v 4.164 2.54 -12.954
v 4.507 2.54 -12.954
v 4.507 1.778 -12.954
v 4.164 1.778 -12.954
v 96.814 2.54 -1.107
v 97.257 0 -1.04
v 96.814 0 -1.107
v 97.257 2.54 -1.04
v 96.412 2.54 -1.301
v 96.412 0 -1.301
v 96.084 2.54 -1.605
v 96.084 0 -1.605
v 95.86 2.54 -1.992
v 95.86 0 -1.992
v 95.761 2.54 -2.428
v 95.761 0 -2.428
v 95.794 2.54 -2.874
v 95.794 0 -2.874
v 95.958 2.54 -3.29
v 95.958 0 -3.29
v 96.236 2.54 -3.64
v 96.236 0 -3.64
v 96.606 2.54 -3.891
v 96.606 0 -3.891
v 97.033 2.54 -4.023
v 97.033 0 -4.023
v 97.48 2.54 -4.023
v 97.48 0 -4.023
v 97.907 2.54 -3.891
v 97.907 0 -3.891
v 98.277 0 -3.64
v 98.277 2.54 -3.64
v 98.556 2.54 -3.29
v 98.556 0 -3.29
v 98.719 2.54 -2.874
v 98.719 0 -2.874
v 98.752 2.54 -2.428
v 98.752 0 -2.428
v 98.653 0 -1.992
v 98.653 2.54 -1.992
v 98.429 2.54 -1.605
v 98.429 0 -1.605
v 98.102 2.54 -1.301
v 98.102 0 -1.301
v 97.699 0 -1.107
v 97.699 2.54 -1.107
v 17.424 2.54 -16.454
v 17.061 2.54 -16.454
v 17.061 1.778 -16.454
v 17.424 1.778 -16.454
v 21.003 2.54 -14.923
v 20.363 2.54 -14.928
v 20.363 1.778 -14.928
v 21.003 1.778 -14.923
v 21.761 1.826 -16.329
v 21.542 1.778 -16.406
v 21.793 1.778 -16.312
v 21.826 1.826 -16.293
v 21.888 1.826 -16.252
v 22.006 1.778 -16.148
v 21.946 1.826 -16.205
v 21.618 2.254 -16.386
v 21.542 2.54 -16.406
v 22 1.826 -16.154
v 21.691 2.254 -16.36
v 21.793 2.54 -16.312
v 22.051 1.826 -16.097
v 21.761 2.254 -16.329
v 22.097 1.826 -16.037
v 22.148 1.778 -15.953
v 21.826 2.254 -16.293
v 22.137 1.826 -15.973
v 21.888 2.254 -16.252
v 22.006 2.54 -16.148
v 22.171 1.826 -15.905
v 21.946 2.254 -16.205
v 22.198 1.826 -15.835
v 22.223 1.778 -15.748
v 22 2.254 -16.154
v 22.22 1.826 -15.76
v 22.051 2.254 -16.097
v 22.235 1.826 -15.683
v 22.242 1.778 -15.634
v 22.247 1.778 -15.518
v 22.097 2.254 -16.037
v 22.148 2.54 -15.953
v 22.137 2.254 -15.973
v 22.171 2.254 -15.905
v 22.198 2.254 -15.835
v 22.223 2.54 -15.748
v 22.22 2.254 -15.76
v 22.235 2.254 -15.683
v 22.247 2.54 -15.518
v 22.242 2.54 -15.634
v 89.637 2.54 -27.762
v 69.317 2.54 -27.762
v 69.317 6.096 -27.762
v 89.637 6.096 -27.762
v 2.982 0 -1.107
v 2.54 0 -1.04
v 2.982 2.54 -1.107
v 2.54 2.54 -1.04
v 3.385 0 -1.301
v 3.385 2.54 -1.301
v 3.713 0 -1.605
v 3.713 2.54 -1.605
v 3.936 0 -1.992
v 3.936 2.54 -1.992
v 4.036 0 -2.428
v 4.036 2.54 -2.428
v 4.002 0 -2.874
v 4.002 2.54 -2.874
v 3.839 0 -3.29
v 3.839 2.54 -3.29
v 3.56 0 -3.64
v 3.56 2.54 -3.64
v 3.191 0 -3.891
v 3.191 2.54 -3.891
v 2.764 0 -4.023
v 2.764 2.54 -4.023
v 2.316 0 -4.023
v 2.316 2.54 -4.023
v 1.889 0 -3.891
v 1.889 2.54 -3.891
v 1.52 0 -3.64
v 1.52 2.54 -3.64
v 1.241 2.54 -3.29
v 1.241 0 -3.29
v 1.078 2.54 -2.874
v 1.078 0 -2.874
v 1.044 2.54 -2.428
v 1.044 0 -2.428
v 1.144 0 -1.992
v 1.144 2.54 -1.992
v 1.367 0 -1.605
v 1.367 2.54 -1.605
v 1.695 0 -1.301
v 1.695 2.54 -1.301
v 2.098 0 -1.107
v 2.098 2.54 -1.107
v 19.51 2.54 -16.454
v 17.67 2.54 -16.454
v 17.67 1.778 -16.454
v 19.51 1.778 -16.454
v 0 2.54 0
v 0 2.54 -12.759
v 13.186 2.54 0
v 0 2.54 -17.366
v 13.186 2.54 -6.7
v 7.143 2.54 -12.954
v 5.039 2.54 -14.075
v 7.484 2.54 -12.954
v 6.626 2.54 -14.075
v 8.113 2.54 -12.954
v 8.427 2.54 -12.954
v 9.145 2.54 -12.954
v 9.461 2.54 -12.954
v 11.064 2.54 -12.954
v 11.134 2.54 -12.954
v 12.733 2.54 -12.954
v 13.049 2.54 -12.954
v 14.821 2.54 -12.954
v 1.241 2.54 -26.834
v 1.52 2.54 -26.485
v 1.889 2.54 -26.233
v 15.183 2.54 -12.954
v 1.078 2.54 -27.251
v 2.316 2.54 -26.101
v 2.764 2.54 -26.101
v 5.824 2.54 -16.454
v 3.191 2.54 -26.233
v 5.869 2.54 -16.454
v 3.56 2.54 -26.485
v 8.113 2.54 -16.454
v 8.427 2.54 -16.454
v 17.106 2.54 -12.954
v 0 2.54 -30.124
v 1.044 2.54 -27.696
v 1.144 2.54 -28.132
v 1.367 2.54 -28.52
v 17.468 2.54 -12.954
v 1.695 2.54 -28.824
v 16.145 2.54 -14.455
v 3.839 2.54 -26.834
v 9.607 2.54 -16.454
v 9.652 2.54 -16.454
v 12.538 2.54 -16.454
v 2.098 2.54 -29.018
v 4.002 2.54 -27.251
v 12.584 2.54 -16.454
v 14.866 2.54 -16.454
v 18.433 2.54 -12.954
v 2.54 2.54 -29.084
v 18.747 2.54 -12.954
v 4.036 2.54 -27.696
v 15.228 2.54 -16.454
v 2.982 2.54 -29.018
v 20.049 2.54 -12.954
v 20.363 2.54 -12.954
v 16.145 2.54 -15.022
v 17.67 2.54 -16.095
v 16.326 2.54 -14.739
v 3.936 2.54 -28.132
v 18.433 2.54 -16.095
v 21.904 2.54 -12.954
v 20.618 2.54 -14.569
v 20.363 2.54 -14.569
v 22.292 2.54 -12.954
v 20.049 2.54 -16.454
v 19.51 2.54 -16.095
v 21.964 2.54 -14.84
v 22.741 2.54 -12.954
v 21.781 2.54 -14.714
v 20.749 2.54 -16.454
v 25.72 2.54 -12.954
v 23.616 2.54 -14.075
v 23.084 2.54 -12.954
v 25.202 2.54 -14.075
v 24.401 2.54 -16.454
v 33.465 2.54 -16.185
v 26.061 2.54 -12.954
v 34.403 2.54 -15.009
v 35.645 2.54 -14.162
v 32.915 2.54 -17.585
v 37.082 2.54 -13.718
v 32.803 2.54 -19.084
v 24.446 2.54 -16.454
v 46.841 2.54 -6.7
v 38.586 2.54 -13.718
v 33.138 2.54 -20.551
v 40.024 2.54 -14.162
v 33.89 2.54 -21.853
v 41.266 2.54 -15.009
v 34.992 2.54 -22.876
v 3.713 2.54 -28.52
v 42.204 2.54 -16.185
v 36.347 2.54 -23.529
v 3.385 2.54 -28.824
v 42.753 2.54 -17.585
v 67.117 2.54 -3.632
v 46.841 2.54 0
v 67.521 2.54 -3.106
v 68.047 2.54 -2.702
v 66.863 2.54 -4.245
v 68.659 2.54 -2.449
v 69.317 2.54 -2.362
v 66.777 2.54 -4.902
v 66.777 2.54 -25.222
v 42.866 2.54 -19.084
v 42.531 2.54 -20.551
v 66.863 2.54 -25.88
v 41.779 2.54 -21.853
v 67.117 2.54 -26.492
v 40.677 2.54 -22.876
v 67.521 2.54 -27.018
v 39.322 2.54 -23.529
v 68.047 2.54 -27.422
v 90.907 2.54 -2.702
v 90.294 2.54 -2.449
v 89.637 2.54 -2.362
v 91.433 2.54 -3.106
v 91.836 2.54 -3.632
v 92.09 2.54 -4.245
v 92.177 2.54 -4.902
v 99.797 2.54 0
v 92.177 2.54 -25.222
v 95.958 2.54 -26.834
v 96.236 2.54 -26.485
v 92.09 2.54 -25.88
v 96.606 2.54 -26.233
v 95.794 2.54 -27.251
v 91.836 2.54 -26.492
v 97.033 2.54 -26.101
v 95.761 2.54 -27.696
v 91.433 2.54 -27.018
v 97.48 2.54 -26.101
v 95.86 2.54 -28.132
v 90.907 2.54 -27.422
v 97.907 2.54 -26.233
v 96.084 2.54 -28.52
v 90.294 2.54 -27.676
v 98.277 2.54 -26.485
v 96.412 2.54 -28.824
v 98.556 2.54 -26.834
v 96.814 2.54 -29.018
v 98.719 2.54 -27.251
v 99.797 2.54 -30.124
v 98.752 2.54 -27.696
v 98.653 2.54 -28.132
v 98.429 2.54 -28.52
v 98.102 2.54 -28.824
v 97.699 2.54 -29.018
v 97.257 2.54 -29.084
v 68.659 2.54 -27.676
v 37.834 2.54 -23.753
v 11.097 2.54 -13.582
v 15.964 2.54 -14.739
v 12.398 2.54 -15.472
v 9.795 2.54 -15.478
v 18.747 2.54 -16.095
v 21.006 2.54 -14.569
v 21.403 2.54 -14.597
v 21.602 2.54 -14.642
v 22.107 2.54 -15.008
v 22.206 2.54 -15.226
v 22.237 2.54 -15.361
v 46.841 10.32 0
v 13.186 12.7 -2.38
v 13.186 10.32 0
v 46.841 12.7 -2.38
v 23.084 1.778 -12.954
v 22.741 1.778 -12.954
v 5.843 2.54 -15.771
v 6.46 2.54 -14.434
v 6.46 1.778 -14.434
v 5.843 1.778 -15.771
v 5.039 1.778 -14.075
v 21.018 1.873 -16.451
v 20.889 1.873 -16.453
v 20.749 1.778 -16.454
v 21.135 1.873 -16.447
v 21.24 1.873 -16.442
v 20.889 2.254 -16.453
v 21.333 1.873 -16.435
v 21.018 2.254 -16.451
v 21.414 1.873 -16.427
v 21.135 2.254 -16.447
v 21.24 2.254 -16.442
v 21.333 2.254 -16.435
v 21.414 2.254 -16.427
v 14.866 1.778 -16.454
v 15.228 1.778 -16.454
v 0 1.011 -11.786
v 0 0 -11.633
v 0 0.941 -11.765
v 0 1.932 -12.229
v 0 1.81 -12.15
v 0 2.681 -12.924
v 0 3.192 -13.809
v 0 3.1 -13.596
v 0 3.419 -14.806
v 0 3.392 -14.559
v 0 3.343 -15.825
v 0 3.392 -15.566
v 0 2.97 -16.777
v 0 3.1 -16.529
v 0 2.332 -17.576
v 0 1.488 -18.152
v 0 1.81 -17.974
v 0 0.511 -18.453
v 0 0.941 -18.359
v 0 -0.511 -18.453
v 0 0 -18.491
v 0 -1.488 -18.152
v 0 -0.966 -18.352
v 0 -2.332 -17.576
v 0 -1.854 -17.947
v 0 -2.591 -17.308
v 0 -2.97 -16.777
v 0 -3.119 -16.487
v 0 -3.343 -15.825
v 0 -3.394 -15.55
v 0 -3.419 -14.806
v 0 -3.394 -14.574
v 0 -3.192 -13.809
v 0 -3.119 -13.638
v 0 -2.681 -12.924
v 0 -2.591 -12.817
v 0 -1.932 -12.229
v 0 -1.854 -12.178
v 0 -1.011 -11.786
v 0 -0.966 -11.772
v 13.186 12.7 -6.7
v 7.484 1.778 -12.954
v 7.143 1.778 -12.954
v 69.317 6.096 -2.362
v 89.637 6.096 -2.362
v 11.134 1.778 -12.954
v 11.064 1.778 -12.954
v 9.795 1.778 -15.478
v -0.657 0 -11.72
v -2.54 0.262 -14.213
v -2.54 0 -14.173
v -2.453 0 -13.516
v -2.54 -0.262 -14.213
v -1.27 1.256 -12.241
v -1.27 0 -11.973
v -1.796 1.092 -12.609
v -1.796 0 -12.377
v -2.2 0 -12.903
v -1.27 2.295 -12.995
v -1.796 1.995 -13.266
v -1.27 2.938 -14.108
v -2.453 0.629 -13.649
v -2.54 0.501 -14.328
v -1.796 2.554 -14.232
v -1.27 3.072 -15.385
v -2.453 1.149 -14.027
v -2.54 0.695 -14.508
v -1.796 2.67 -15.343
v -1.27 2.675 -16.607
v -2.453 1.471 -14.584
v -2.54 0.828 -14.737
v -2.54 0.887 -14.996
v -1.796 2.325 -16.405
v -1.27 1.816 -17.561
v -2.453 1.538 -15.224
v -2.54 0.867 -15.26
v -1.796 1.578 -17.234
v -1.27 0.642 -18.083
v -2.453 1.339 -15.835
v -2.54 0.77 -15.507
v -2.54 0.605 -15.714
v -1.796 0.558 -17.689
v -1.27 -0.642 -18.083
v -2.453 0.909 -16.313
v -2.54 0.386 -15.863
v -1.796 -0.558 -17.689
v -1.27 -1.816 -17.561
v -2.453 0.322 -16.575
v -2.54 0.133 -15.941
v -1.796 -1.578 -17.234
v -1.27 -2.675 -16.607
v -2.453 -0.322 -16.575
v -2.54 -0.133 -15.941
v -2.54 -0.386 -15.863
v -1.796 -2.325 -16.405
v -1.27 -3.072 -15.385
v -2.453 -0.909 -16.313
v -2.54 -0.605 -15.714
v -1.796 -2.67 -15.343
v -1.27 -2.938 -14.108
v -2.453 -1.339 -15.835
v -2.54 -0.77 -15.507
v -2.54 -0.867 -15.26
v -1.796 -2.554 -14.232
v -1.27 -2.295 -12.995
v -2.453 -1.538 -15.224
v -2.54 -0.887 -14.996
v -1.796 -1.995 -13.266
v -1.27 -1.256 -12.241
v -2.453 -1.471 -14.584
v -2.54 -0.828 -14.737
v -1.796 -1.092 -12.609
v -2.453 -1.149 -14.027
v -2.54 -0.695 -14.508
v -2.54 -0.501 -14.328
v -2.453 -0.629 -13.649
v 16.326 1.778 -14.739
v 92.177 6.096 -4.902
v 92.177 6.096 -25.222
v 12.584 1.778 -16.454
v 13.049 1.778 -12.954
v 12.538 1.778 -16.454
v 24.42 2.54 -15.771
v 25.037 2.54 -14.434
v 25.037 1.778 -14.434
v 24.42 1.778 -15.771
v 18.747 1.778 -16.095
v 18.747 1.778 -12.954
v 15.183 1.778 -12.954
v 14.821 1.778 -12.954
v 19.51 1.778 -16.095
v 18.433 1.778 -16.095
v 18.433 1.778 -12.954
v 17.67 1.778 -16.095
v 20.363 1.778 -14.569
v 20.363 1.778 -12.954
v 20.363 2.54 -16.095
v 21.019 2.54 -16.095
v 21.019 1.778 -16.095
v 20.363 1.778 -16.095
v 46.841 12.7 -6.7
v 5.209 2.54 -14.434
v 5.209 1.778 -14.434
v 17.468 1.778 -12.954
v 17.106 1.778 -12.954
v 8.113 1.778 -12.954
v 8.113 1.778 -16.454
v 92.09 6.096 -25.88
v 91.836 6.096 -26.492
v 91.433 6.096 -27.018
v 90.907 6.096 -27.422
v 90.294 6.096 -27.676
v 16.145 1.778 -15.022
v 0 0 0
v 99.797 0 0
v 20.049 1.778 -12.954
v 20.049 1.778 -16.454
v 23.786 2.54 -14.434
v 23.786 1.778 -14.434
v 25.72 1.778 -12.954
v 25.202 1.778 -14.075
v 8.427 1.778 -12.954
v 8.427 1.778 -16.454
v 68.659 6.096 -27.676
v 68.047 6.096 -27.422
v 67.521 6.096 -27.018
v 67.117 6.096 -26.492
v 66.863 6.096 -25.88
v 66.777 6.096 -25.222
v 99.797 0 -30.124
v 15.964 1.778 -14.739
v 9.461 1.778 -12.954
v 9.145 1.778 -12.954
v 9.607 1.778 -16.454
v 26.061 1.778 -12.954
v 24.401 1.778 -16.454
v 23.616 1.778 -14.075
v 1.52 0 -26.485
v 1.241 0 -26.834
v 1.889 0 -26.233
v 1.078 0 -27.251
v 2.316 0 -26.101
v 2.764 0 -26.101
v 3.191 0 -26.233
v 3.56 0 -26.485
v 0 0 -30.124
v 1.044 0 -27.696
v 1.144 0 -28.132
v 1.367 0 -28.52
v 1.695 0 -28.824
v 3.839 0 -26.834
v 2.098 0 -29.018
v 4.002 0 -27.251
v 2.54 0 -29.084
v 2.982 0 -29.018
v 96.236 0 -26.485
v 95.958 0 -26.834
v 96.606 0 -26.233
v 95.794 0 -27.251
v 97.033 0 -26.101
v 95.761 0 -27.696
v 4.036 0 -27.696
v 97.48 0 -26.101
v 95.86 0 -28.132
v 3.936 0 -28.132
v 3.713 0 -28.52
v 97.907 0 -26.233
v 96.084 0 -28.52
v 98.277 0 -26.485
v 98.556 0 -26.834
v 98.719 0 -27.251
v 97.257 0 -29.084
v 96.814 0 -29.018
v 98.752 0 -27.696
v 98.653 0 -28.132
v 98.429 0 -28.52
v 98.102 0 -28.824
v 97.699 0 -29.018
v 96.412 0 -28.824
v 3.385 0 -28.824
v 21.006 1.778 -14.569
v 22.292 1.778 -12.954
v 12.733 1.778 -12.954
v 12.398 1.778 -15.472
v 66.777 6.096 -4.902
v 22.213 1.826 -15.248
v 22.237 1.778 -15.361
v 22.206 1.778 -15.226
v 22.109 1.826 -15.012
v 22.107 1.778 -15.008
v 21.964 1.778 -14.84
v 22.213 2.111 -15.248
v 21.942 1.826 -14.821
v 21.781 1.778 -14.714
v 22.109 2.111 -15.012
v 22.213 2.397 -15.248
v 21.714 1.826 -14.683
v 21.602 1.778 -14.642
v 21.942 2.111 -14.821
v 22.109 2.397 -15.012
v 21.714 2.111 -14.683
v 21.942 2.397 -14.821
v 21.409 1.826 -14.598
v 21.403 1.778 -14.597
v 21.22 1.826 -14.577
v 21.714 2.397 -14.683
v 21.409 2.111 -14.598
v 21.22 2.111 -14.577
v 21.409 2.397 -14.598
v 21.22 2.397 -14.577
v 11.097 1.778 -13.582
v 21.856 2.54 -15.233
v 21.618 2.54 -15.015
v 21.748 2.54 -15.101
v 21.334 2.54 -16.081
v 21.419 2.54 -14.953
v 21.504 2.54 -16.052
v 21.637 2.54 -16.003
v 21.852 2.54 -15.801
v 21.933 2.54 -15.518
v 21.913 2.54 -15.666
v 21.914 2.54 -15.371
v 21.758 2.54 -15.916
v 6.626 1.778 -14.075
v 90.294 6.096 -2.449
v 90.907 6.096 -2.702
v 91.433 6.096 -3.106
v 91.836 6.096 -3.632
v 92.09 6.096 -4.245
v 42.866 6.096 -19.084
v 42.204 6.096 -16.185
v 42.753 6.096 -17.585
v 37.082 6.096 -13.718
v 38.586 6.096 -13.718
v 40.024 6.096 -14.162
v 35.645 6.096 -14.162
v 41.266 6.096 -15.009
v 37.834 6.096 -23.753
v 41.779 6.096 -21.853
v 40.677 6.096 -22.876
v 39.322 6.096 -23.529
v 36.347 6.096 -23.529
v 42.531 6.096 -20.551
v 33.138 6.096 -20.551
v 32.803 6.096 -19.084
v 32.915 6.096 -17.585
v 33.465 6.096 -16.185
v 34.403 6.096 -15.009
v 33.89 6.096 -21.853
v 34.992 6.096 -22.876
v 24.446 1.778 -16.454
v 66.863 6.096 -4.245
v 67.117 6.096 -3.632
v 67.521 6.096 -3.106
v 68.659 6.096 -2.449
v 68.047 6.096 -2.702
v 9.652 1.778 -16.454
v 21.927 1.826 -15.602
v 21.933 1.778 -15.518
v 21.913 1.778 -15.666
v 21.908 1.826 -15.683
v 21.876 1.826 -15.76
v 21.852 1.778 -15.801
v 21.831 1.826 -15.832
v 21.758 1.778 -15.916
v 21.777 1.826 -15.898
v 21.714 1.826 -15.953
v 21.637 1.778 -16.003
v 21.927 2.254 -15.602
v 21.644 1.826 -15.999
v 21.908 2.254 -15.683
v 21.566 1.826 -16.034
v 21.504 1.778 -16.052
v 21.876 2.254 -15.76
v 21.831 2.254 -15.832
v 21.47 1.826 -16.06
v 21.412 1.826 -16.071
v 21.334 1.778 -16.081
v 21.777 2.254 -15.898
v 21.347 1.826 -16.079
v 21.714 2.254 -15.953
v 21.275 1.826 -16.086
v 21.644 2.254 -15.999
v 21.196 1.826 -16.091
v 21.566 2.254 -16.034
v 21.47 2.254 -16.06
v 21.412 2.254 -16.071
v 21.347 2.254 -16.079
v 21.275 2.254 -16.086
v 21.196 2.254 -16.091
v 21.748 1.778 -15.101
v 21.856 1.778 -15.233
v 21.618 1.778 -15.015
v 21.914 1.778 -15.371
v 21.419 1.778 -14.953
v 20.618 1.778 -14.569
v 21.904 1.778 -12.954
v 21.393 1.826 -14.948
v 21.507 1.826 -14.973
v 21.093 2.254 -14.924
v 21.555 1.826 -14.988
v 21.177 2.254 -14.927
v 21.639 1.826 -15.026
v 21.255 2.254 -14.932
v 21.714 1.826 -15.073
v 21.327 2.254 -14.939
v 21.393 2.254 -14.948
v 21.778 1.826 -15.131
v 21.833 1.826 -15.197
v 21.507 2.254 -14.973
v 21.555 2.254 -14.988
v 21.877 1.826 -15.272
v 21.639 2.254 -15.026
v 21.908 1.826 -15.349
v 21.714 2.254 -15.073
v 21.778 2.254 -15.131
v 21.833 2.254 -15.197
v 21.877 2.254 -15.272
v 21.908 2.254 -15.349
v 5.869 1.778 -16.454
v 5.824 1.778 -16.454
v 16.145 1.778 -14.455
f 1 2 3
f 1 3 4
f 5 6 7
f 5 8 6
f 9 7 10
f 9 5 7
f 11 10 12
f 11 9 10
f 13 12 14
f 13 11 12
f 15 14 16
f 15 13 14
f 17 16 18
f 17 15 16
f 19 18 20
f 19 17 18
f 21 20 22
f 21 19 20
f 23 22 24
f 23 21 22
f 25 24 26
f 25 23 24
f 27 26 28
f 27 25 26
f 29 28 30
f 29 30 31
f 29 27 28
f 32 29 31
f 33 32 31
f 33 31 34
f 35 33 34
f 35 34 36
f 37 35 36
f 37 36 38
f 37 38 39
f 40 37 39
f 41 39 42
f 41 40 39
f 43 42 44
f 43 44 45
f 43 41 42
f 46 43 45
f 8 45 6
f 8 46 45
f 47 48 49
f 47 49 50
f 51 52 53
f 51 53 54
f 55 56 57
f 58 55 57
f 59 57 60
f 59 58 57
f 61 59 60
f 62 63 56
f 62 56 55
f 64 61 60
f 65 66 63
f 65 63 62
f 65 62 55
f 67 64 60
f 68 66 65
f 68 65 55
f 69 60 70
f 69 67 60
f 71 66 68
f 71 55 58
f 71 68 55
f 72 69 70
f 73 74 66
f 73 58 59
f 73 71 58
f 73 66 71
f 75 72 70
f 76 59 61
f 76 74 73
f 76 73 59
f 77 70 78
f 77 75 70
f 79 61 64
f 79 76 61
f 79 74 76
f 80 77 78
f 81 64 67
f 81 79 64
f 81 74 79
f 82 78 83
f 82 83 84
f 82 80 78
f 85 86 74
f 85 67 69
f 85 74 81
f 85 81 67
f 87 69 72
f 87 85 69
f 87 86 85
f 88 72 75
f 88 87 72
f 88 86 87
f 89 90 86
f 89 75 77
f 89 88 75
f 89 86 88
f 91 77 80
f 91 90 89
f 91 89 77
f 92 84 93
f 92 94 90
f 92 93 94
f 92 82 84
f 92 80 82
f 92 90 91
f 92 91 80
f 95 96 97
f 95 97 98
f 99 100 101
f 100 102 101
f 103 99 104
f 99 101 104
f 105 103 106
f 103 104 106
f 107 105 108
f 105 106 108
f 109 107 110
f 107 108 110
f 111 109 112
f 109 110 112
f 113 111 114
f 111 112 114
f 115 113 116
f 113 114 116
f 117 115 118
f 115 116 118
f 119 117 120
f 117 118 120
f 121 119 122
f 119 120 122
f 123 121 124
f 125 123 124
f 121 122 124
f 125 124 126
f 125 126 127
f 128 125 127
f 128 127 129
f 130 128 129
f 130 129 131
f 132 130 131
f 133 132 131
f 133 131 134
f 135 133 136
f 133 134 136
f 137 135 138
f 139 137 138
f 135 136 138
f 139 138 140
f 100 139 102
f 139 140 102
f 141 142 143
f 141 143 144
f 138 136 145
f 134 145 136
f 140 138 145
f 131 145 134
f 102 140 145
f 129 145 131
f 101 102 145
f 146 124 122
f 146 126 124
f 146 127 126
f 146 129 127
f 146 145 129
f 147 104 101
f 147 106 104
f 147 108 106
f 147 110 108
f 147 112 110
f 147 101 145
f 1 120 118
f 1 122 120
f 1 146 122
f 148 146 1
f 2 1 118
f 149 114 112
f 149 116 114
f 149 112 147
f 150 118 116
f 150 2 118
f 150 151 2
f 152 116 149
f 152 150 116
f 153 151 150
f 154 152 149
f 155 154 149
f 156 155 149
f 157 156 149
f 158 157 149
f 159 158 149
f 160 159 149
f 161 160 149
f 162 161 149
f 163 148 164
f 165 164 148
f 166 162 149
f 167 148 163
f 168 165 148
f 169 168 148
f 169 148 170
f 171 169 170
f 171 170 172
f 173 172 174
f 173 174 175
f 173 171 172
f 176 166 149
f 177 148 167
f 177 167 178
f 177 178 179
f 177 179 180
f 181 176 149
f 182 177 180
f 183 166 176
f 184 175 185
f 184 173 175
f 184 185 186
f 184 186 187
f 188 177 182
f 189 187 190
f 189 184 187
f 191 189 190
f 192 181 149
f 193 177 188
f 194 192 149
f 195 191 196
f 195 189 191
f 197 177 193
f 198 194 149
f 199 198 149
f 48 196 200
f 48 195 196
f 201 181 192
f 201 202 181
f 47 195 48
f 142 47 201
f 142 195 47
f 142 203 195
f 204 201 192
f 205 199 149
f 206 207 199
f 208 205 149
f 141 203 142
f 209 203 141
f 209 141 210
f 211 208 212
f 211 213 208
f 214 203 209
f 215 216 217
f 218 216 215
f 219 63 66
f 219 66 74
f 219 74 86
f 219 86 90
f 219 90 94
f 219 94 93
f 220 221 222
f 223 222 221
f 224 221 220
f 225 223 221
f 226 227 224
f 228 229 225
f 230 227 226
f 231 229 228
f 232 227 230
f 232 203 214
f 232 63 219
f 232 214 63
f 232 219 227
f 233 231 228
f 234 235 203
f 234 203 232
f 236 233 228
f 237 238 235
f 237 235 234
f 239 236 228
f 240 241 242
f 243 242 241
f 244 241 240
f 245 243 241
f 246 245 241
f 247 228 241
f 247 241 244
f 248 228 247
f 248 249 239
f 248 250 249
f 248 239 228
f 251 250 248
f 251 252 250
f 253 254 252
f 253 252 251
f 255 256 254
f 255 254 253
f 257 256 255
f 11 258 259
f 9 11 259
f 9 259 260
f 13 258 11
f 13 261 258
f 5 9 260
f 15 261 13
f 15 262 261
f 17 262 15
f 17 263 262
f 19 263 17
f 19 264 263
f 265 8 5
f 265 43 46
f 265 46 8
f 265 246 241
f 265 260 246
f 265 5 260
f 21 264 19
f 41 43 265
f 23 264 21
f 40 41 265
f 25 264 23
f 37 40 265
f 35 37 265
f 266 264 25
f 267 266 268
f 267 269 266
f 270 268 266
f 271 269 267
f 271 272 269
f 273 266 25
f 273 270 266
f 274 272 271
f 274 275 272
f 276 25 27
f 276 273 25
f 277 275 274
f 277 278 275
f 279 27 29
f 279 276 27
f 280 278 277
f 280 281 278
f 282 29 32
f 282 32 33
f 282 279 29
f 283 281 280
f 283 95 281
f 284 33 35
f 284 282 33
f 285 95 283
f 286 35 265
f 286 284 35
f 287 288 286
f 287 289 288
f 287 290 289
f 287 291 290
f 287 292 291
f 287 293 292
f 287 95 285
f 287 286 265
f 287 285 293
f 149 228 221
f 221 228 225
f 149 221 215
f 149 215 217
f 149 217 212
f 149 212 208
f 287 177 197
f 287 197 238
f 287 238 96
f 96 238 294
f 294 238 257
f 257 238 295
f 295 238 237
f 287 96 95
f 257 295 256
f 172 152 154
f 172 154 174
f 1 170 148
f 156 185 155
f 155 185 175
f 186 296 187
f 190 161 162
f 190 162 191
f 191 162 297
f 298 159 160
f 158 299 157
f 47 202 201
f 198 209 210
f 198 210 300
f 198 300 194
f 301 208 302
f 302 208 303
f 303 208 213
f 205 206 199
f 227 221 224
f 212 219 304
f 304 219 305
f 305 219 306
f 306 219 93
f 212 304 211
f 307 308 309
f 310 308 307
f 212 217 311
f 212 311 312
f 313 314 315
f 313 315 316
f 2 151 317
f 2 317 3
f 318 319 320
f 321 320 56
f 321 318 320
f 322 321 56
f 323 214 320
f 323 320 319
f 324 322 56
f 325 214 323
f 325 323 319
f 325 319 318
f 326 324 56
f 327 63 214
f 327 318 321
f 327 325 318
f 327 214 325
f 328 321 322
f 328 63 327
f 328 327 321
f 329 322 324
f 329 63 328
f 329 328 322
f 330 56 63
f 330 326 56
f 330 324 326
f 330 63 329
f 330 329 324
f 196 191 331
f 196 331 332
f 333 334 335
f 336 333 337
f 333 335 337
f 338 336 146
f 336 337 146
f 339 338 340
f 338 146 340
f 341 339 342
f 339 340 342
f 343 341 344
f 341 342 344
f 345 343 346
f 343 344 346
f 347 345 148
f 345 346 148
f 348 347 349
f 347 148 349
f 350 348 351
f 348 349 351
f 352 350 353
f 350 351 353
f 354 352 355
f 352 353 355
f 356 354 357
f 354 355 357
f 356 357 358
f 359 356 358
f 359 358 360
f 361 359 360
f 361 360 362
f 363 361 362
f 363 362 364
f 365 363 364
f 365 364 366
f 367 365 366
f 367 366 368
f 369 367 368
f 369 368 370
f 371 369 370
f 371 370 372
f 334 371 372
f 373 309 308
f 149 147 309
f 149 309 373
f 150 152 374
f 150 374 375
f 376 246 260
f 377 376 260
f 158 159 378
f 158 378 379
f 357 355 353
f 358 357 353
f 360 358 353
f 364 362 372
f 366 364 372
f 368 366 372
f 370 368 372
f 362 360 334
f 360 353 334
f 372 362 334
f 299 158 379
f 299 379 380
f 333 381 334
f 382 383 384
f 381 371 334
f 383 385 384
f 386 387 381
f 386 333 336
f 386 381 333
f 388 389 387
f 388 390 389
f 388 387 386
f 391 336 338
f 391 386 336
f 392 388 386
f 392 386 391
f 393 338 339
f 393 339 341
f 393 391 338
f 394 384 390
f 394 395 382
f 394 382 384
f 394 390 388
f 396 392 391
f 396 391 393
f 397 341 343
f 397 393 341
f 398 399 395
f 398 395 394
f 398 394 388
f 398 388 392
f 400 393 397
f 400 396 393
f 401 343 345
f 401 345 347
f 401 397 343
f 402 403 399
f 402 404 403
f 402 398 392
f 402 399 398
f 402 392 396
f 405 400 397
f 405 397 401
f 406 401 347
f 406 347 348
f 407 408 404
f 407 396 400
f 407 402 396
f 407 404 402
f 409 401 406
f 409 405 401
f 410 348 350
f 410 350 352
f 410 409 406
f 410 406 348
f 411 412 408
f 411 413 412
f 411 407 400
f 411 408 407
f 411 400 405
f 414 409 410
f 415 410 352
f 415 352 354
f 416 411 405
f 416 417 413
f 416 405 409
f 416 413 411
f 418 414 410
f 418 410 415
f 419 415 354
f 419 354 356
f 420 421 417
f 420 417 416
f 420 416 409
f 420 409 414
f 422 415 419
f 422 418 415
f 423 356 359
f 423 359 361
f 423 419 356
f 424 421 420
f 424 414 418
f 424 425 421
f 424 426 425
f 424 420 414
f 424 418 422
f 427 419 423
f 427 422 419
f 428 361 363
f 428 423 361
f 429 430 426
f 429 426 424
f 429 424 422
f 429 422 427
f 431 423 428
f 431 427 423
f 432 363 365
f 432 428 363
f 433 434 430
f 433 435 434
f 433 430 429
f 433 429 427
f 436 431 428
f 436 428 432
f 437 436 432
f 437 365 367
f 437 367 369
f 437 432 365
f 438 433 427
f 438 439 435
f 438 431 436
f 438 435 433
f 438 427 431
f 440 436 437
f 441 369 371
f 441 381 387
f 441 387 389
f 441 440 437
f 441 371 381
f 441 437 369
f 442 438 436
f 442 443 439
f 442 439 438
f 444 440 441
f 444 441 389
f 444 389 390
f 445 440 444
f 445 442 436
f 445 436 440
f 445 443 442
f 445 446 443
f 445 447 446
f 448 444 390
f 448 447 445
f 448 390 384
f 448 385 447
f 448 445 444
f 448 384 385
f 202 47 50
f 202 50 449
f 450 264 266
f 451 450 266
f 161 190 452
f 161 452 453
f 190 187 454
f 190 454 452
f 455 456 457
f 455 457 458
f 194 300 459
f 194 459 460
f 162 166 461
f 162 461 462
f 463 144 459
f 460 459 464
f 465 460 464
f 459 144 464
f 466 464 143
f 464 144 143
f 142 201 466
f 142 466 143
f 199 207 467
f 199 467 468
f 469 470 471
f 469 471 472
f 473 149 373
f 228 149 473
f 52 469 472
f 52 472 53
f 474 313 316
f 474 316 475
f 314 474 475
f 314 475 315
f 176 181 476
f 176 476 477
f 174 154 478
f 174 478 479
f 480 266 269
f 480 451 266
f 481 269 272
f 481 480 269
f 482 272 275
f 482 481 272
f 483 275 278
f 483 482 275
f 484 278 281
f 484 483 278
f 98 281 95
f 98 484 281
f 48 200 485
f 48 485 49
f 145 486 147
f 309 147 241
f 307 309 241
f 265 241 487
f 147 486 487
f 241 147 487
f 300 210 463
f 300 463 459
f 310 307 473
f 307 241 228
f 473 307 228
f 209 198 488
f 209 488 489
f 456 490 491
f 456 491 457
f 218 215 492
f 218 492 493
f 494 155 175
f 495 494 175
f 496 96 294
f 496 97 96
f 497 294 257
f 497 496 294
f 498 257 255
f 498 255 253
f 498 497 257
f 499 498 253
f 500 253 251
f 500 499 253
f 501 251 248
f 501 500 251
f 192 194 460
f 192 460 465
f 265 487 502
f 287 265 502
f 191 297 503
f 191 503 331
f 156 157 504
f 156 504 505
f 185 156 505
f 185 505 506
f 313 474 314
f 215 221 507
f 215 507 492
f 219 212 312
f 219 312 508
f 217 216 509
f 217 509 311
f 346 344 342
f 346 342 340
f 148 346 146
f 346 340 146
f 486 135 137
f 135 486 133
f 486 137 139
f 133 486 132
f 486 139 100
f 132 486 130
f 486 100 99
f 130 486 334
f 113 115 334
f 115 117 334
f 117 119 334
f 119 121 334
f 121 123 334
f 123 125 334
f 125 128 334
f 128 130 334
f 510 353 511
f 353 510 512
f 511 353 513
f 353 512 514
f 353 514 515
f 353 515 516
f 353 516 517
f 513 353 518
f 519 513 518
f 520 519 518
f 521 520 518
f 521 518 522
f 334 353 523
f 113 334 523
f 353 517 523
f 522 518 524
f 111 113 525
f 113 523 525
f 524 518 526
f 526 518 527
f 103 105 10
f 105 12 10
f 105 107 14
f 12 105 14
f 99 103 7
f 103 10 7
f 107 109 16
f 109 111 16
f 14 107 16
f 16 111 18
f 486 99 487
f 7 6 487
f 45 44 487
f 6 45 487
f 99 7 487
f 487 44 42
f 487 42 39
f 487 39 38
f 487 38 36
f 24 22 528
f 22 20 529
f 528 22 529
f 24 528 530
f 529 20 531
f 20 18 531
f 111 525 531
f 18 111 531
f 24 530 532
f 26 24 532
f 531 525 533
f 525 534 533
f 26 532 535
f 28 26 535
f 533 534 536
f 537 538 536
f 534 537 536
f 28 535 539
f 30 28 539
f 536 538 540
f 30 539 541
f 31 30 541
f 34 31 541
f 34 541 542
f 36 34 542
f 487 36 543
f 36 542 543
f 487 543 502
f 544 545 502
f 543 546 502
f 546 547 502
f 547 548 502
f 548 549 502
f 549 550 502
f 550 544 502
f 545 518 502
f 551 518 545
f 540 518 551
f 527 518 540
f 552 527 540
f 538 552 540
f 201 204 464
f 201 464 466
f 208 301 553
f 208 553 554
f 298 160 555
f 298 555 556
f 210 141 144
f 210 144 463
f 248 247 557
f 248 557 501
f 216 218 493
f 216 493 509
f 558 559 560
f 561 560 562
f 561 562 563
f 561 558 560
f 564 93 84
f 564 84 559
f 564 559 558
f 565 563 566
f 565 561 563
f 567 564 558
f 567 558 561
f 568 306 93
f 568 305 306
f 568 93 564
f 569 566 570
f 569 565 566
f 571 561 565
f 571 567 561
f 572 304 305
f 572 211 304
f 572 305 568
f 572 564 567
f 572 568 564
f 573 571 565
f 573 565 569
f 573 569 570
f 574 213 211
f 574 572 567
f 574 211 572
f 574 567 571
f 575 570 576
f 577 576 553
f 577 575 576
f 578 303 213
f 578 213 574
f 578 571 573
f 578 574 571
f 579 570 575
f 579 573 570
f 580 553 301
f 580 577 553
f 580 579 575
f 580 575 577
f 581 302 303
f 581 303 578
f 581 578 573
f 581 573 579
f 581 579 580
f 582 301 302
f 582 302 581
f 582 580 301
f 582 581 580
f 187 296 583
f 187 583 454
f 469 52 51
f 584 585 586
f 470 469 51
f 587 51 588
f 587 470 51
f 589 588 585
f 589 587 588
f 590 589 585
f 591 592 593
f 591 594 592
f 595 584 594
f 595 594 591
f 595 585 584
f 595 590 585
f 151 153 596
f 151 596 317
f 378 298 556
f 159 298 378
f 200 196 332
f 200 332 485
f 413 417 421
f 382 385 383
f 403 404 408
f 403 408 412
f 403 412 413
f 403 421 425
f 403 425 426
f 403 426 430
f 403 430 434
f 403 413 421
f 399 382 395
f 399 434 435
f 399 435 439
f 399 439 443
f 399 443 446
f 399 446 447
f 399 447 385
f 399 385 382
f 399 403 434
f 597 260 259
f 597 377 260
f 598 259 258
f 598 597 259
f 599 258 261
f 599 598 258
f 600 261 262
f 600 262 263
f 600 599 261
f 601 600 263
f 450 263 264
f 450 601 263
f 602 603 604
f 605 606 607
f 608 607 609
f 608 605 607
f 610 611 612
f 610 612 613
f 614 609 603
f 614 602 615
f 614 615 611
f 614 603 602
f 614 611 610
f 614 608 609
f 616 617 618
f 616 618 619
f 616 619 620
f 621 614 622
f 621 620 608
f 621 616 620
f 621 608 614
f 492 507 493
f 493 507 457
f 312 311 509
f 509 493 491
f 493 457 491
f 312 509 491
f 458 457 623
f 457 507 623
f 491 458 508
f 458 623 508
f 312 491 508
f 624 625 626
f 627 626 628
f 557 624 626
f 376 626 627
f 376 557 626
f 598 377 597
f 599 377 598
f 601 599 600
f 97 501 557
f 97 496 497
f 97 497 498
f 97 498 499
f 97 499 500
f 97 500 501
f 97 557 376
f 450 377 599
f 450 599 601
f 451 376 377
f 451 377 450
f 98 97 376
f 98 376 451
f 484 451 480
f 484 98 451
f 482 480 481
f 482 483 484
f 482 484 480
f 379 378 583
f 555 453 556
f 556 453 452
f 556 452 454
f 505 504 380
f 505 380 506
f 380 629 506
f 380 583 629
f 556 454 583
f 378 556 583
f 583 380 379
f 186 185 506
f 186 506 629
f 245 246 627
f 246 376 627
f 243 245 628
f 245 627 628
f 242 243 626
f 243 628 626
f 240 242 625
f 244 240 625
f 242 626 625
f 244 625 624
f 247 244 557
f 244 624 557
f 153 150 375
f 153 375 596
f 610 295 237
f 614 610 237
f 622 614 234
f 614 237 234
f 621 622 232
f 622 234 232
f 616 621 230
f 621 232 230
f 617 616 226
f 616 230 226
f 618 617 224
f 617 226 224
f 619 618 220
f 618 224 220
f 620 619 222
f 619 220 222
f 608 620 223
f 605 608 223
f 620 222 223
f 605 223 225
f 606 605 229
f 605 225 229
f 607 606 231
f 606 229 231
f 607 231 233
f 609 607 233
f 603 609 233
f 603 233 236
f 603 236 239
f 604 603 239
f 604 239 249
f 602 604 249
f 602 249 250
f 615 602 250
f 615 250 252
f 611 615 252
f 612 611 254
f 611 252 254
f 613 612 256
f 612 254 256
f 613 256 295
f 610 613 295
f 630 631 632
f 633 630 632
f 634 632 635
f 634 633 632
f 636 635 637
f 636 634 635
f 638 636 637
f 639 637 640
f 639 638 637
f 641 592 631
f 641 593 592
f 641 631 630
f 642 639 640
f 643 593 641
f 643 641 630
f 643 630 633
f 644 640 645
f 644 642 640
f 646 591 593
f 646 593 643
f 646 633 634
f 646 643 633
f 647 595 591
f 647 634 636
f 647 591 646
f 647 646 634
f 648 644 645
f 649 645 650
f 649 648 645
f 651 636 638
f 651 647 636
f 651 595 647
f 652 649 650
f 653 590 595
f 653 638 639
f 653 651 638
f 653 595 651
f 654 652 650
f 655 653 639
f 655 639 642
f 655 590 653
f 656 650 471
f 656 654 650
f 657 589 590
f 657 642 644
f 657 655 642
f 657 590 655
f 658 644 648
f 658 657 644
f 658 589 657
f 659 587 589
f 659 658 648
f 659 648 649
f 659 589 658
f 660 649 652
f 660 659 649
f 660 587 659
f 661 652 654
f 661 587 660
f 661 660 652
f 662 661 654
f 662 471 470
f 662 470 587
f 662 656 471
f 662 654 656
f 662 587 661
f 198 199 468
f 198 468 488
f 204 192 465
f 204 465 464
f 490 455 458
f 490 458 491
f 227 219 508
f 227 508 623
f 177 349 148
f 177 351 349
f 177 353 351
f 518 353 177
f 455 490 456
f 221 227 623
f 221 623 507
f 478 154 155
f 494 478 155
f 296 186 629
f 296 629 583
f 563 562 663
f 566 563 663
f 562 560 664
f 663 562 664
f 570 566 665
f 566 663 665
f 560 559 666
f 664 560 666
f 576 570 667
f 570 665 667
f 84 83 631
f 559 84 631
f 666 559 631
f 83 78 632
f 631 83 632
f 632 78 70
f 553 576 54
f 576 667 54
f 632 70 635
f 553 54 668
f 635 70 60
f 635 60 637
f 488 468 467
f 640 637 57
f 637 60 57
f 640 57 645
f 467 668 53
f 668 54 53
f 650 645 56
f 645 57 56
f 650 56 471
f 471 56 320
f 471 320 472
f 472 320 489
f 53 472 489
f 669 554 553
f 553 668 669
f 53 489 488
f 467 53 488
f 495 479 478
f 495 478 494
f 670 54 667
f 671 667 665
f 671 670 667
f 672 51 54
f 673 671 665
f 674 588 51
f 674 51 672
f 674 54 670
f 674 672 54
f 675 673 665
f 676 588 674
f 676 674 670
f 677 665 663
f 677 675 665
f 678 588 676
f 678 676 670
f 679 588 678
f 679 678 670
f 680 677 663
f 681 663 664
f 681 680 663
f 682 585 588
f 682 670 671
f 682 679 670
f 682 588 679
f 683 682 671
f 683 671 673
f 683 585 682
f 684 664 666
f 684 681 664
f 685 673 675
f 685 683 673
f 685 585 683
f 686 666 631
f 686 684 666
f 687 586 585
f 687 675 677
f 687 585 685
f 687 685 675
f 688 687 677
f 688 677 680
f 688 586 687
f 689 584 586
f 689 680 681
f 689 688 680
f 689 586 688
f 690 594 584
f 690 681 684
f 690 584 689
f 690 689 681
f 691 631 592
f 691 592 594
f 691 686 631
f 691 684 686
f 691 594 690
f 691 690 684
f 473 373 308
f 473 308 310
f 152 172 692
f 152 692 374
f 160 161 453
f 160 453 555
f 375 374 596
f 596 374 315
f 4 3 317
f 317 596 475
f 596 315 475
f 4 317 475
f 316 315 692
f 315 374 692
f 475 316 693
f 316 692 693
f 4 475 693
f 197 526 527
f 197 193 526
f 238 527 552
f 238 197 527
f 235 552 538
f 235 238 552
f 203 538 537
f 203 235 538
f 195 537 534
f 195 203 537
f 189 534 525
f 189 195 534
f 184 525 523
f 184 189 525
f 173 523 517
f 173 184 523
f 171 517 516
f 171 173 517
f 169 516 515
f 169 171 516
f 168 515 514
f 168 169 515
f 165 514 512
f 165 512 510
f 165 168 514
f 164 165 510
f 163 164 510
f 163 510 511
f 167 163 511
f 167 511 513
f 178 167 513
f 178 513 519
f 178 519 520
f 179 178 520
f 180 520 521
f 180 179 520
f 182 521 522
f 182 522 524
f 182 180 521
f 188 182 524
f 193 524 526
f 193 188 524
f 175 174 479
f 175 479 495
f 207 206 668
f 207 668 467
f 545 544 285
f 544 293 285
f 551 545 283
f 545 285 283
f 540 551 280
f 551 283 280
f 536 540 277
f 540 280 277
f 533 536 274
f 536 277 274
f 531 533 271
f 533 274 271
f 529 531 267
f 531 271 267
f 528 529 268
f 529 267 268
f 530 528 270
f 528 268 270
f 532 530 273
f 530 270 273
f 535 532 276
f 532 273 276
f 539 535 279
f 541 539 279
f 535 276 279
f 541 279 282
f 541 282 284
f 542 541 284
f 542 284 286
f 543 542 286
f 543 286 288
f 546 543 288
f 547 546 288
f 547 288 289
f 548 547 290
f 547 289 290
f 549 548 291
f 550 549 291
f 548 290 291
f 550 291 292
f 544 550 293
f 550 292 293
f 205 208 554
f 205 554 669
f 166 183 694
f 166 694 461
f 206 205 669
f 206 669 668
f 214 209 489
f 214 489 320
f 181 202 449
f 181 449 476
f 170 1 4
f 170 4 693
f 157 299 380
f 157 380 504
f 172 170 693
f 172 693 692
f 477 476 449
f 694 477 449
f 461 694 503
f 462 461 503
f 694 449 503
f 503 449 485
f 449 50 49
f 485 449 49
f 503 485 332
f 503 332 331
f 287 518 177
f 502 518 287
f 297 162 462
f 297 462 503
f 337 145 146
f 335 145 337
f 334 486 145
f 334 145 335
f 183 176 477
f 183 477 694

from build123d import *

# Parameters (mm, degrees)
SKETCH1_W           = 99.7966
SKETCH1_H           = 30.1244
BOSS_EXTRUDE1_DEPTH = 2.54
SKETCH2_W           = 33.65475448
SKETCH2_H           = 6.70026545
BOSS_EXTRUDE2_DEPTH = 10.16
SKETCH3_R           = 5.045566178
SKETCH3_W           = 25.4
SKETCH3_H           = 25.4
BOSS_EXTRUDE3_DEPTH = 3.556
FILLET1_R           = 2.54
SKETCH4_R           = 3.429
BOSS_EXTRUDE4_DEPTH = 2.54
FILLET2_R           = 2.54
CHAMFER1_SIZE       = 2.38
SKETCH5_W           = 0.314102564
SKETCH5_H           = 3.5
CUT_EXTRUDE1_DEPTH  = 0.762


with BuildPart() as part:
    # Sketch1 → Boss-Extrude1 (new body)
    with BuildSketch(Plane(origin=(0, 0, 0), x_dir=(1, 0, 0), z_dir=(0, 1, 0))):
        with Locations((49.8983, 15.0622)):
            Rectangle(SKETCH1_W, SKETCH1_H)
    extrude(amount=BOSS_EXTRUDE1_DEPTH)

    # Sketch2 → Boss-Extrude2 (add)
    with BuildSketch(Plane(origin=(0, 2.54, 0), x_dir=(1, 0, 0), z_dir=(0, 1, 0))):
        with Locations((30.013421746, 3.350132725)):
            Rectangle(SKETCH2_W, SKETCH2_H)
    extrude(amount=BOSS_EXTRUDE2_DEPTH)

    # Sketch3 → Boss-Extrude3 (add)
    with BuildSketch(Plane(origin=(0, 2.54, 0), x_dir=(1, 0, 0), z_dir=(0, 1, 0))):
        with Locations(Location((37.834363192, 18.707427202, 0), (0, 0, 90))):
            Circle(SKETCH3_R)
        with Locations((79.4766, 15.0622)):
            Rectangle(SKETCH3_W, SKETCH3_H)
    extrude(amount=BOSS_EXTRUDE3_DEPTH)

    # Fillet1
    fillet1_edges = [part.edges().sort_by_distance(p)[0] for p in [
        (92.1766, 4.318, -27.7622),
        (66.7766, 4.318, -27.7622),
        (66.7766, 4.318, -2.3622),
        (92.1766, 4.318, -2.3622),
    ]]
    fillet(fillet1_edges, radius=FILLET1_R)

    # Sketch4 → Boss-Extrude4 (add)
    with BuildSketch(Plane.ZY):
        with Locations((-15.0622, 0)):
            Circle(SKETCH4_R)
    extrude(amount=BOSS_EXTRUDE4_DEPTH)

    # Fillet2
    fillet2_edges = [part.edges().sort_by_distance(p)[0] for p in [
        (-2.54, 0, -18.4912),
    ]]
    fillet(fillet2_edges, radius=FILLET2_R - 0.0001)  # a hair under: the kernel refuses the full size

    # Chamfer1
    chamfer1_edges = [part.edges().sort_by_distance(p)[0] for p in [
        (30.013421746, 12.7, 0),
    ]]
    chamfer(chamfer1_edges, length=CHAMFER1_SIZE)

    # Sketch5 → Cut-Extrude1 (cut)
    # profile 1 of 7: a face of its own
    with BuildSketch(Plane(origin=(0, 2.54, 0), x_dir=(1, 0, 0), z_dir=(0, 1, 0))):
        Polygon((5.86903585, 16.453640261), (7.484420465, 12.953640261), (7.142974151, 12.953640261), (6.625546267, 14.075435133), (5.038907645, 14.075435133), (4.506756203, 12.953640261), (4.163907645, 12.953640261), (5.824164055, 16.453640261), align=None)
        Polygon((5.843094344, 15.771448755), (5.209280241, 14.434409492), (6.460081523, 14.434409492), align=None, mode=Mode.SUBTRACT)
    # profile 2 of 7: a face of its own
    with BuildSketch(Plane(origin=(0, 2.54, 0), x_dir=(1, 0, 0), z_dir=(0, 1, 0))):
        with Locations((8.269676876, 14.703640261)):
            Rectangle(SKETCH5_W, SKETCH5_H)
    # profile 3 of 7: a face of its own
    with BuildSketch(Plane(origin=(0, 2.54, 0), x_dir=(1, 0, 0), z_dir=(0, 1, 0))):
        Polygon((9.144676876, 12.953640261), (9.606716138, 16.453640261), (9.651587933, 16.453640261), (11.096599953, 13.581845389), (12.538106363, 16.453640261), (12.58367928, 16.453640261), (13.04852303, 12.953640261), (12.733018222, 12.953640261), (12.397882004, 15.472069748), (11.13446053, 12.953640261), (11.063647228, 12.953640261), (9.795317901, 15.477678723), (9.460882805, 12.953640261), align=None)
    # profile 4 of 7: a face of its own
    with BuildSketch(Plane(origin=(0, 2.54, 0), x_dir=(1, 0, 0), z_dir=(0, 1, 0))):
        Polygon((14.865830722, 16.453640261), (15.22831069, 16.453640261), (16.144676876, 15.021949556), (17.061043062, 16.453640261), (17.42352303, 16.453640261), (16.326267421, 14.738696351), (17.468394824, 12.953640261), (17.105914856, 12.953640261), (16.144676876, 14.455443146), (15.183438895, 12.953640261), (14.820958927, 12.953640261), (15.963787453, 14.738696351), align=None)
    # profile 5 of 7: a face of its own
    with BuildSketch(Plane(origin=(0, 2.54, 0), x_dir=(1, 0, 0), z_dir=(0, 1, 0))):
        Polygon((17.670317901, 16.094665902), (17.670317901, 16.453640261), (19.510061491, 16.453640261), (19.510061491, 16.094665902), (18.747240978, 16.094665902), (18.747240978, 12.953640261), (18.433138414, 12.953640261), (18.433138414, 16.094665902), align=None)
    # profile 6 of 7: a face of its own
    with BuildSketch(Plane(origin=(0, 2.54, 0), x_dir=(1, 0, 0), z_dir=(0, 1, 0))):
        with BuildLine():
            Line((20.04852303, 16.453640261), (20.748943703, 16.453640261))
            add(Edge.make_bspline(
                [(20.748943703, 16.453640261), (20.795684831, 16.453484675), (20.885432976, 16.453185933), (21.014006246, 16.45152017), (21.130833343, 16.446745814), (21.235853182, 16.442637231), (21.329063837, 16.435145289), (21.410751128, 16.427984642), (21.480538825, 16.418610981), (21.522784677, 16.409905558), (21.541912453, 16.405963979)],
                knots=[0, 0, 0, 0, 1.410062039, 2.707475311, 3.878576406, 4.937260626, 5.877586885, 6.699081471, 7.410979367, 8, 8, 8, 8], degree=3))
            add(Edge.make_bspline(
                [(21.541912453, 16.405963979), (21.567519077, 16.399637214), (21.618186066, 16.38711865), (21.691136132, 16.360659049), (21.760650456, 16.330039425), (21.826440281, 16.294075704), (21.888176072, 16.252500925), (21.946494383, 16.206032802), (22.001659846, 16.154925596), (22.051441476, 16.097890755), (22.098380528, 16.038054245), (22.137969154, 15.973350488), (22.172095634, 15.905688961), (22.199266151, 15.834381543), (22.221144124, 15.760119771), (22.236570364, 15.682230974), (22.245821551, 15.601069999), (22.246763407, 15.545712091), (22.247240978, 15.517642665)],
                knots=[0, 0, 0, 0, 1.027469482, 2.033020251, 3.019912614, 3.986113645, 4.951240523, 5.91722682, 6.890402269, 7.87763091, 8.8651537, 9.85103654, 10.82876324, 11.815024772, 12.821070561, 13.842952187, 14.906261191, 16, 16, 16, 16], degree=3))
            add(Edge.make_bspline(
                [(22.247240978, 15.517642665), (22.24577198, 15.47100756), (22.242905584, 15.380010392), (22.216180481, 15.247949511), (22.172403961, 15.124760196), (22.112080672, 15.010597558), (22.035261196, 14.907686913), (21.942936405, 14.817296458), (21.835054794, 14.741656545), (21.734625478, 14.68920374), (21.645911278, 14.655610832), (21.572877965, 14.631974473), (21.493210988, 14.613712508), (21.407673653, 14.597352376), (21.315909998, 14.585000682), (21.218139958, 14.575954087), (21.114293807, 14.570300038), (21.042954737, 14.569458033), (21.006255401, 14.569024876)],
                knots=[0, 0, 0, 0, 1.260483769, 2.459530307, 3.627416485, 4.787058657, 5.939039949, 7.08810263, 8.267026773, 9.491475466, 10.141966685, 10.831826277, 11.566392101, 12.351337768, 13.187381173, 14.07005841, 15.007169909, 16, 16, 16, 16], degree=3))
            Line((21.006255401, 14.569024876), (22.292112773, 12.953640261))
            Line((22.292112773, 12.953640261), (21.903691299, 12.953640261))
            Line((21.903691299, 12.953640261), (20.617833927, 14.569024876))
            Line((20.617833927, 14.569024876), (20.362625594, 14.569024876))
            Line((20.362625594, 14.569024876), (20.362625594, 12.953640261))
            Line((20.362625594, 12.953640261), (20.04852303, 12.953640261))
            Line((20.04852303, 12.953640261), (20.04852303, 16.453640261))
        make_face()
        with BuildLine():
            Line((20.362625594, 16.094665902), (20.362625594, 14.927999235))
            Line((20.362625594, 14.927999235), (21.003450914, 14.923091383))
            add(Edge.make_bspline(
                [(21.003450914, 14.923091383), (21.033370953, 14.923078146), (21.09136451, 14.92305249), (21.175265175, 14.927046266), (21.253385287, 14.931589584), (21.325426039, 14.93853893), (21.391419614, 14.947495002), (21.451333027, 14.958697986), (21.505264079, 14.971750048), (21.568162618, 14.991951674), (21.638399149, 15.023957692), (21.714730609, 15.070523191), (21.779732947, 15.12909231), (21.834650809, 15.196065766), (21.87878024, 15.269702015), (21.909892295, 15.349118384), (21.929634737, 15.432309982), (21.931963283, 15.48948809), (21.933138414, 15.518343787)],
                knots=[0, 0, 0, 0, 1.146690395, 2.22261258, 3.21895312, 4.145990853, 4.996080663, 5.770904154, 6.481378293, 7.121626537, 8.300444488, 9.431385265, 10.535395872, 11.636531494, 12.74115979, 13.810798291, 14.895190096, 16, 16, 16, 16], degree=3))
            add(Edge.make_bspline(
                [(21.933138414, 15.518343787), (21.931936293, 15.54649036), (21.929554128, 15.602266599), (21.910105359, 15.683922509), (21.877215978, 15.76098946), (21.83289374, 15.833153945), (21.778894585, 15.89865968), (21.715576772, 15.954706833), (21.644671577, 16.000956298), (21.578400379, 16.030510679), (21.519166166, 16.048630532), (21.467736506, 16.061381696), (21.409625028, 16.071626165), (21.34454957, 16.079834225), (21.272787939, 16.08688917), (21.193977288, 16.091640948), (21.108640508, 16.094454812), (21.049493577, 16.094593901), (21.018875594, 16.094665902)],
                knots=[0, 0, 0, 0, 1.101028733, 2.181837193, 3.264309656, 4.369019818, 5.486613113, 6.575447106, 7.666700264, 8.788928104, 9.402425223, 10.0903467, 10.862060571, 11.710948788, 12.657782767, 13.684531032, 14.801375019, 16, 16, 16, 16], degree=3))
            Line((21.018875594, 16.094665902), (20.362625594, 16.094665902))
        make_face(mode=Mode.SUBTRACT)
    # profile 7 of 7: a face of its own
    with BuildSketch(Plane(origin=(0, 2.54, 0), x_dir=(1, 0, 0), z_dir=(0, 1, 0))):
        Polygon((24.445958927, 16.453640261), (26.061343542, 12.953640261), (25.719897228, 12.953640261), (25.202469344, 14.075435133), (23.615830722, 14.075435133), (23.08367928, 12.953640261), (22.740830722, 12.953640261), (24.401087132, 16.453640261), align=None)
        Polygon((24.420017421, 15.771448755), (23.786203318, 14.434409492), (25.0370046, 14.434409492), align=None, mode=Mode.SUBTRACT)
    extrude(amount=-CUT_EXTRUDE1_DEPTH, mode=Mode.SUBTRACT)

    # Sketch9 → Ø1.5mm Dowel Hole1 (revolve, cut)
    with BuildSketch(Plane(origin=(97.2566, 2.54, -2.54), x_dir=(0, 0, 1), z_dir=(1, 0, 0))):
        Polygon((0, 0), (0, 3.441290929), (1.5, 2.54), (1.5, 0), align=None)
    f_1_5mm_dowel_hole1 = revolve(axis=Axis((97.2566, 8.89, -2.54), (0, -1, 0)), mode=Mode.SUBTRACT)

    # Mirror1: Ø1.5mm Dowel Hole1 across plane
    add(f_1_5mm_dowel_hole1.mirror(Plane.XY.offset(-15.0622)), mode=Mode.SUBTRACT)

    # Mirror2: Ø1.5mm Dowel Hole1 across plane
    add(f_1_5mm_dowel_hole1.mirror(Plane.ZY.offset(-49.8983)), mode=Mode.SUBTRACT)

    # Mirror2 copy 1 sketch → Mirror2 copy 1 (revolve, cut)
    with BuildSketch(Plane(origin=(2.54, 2.54, -27.5844), x_dir=(0, 0, -1), z_dir=(-1, 0, 0))):
        Polygon((0, 0), (0, 3.441290929), (1.5, 2.54), (1.5, 0), align=None)
    revolve(axis=Axis((2.54, 8.89, -27.5844), (0, -1, 0)), mode=Mode.SUBTRACT)


solid = part.part
